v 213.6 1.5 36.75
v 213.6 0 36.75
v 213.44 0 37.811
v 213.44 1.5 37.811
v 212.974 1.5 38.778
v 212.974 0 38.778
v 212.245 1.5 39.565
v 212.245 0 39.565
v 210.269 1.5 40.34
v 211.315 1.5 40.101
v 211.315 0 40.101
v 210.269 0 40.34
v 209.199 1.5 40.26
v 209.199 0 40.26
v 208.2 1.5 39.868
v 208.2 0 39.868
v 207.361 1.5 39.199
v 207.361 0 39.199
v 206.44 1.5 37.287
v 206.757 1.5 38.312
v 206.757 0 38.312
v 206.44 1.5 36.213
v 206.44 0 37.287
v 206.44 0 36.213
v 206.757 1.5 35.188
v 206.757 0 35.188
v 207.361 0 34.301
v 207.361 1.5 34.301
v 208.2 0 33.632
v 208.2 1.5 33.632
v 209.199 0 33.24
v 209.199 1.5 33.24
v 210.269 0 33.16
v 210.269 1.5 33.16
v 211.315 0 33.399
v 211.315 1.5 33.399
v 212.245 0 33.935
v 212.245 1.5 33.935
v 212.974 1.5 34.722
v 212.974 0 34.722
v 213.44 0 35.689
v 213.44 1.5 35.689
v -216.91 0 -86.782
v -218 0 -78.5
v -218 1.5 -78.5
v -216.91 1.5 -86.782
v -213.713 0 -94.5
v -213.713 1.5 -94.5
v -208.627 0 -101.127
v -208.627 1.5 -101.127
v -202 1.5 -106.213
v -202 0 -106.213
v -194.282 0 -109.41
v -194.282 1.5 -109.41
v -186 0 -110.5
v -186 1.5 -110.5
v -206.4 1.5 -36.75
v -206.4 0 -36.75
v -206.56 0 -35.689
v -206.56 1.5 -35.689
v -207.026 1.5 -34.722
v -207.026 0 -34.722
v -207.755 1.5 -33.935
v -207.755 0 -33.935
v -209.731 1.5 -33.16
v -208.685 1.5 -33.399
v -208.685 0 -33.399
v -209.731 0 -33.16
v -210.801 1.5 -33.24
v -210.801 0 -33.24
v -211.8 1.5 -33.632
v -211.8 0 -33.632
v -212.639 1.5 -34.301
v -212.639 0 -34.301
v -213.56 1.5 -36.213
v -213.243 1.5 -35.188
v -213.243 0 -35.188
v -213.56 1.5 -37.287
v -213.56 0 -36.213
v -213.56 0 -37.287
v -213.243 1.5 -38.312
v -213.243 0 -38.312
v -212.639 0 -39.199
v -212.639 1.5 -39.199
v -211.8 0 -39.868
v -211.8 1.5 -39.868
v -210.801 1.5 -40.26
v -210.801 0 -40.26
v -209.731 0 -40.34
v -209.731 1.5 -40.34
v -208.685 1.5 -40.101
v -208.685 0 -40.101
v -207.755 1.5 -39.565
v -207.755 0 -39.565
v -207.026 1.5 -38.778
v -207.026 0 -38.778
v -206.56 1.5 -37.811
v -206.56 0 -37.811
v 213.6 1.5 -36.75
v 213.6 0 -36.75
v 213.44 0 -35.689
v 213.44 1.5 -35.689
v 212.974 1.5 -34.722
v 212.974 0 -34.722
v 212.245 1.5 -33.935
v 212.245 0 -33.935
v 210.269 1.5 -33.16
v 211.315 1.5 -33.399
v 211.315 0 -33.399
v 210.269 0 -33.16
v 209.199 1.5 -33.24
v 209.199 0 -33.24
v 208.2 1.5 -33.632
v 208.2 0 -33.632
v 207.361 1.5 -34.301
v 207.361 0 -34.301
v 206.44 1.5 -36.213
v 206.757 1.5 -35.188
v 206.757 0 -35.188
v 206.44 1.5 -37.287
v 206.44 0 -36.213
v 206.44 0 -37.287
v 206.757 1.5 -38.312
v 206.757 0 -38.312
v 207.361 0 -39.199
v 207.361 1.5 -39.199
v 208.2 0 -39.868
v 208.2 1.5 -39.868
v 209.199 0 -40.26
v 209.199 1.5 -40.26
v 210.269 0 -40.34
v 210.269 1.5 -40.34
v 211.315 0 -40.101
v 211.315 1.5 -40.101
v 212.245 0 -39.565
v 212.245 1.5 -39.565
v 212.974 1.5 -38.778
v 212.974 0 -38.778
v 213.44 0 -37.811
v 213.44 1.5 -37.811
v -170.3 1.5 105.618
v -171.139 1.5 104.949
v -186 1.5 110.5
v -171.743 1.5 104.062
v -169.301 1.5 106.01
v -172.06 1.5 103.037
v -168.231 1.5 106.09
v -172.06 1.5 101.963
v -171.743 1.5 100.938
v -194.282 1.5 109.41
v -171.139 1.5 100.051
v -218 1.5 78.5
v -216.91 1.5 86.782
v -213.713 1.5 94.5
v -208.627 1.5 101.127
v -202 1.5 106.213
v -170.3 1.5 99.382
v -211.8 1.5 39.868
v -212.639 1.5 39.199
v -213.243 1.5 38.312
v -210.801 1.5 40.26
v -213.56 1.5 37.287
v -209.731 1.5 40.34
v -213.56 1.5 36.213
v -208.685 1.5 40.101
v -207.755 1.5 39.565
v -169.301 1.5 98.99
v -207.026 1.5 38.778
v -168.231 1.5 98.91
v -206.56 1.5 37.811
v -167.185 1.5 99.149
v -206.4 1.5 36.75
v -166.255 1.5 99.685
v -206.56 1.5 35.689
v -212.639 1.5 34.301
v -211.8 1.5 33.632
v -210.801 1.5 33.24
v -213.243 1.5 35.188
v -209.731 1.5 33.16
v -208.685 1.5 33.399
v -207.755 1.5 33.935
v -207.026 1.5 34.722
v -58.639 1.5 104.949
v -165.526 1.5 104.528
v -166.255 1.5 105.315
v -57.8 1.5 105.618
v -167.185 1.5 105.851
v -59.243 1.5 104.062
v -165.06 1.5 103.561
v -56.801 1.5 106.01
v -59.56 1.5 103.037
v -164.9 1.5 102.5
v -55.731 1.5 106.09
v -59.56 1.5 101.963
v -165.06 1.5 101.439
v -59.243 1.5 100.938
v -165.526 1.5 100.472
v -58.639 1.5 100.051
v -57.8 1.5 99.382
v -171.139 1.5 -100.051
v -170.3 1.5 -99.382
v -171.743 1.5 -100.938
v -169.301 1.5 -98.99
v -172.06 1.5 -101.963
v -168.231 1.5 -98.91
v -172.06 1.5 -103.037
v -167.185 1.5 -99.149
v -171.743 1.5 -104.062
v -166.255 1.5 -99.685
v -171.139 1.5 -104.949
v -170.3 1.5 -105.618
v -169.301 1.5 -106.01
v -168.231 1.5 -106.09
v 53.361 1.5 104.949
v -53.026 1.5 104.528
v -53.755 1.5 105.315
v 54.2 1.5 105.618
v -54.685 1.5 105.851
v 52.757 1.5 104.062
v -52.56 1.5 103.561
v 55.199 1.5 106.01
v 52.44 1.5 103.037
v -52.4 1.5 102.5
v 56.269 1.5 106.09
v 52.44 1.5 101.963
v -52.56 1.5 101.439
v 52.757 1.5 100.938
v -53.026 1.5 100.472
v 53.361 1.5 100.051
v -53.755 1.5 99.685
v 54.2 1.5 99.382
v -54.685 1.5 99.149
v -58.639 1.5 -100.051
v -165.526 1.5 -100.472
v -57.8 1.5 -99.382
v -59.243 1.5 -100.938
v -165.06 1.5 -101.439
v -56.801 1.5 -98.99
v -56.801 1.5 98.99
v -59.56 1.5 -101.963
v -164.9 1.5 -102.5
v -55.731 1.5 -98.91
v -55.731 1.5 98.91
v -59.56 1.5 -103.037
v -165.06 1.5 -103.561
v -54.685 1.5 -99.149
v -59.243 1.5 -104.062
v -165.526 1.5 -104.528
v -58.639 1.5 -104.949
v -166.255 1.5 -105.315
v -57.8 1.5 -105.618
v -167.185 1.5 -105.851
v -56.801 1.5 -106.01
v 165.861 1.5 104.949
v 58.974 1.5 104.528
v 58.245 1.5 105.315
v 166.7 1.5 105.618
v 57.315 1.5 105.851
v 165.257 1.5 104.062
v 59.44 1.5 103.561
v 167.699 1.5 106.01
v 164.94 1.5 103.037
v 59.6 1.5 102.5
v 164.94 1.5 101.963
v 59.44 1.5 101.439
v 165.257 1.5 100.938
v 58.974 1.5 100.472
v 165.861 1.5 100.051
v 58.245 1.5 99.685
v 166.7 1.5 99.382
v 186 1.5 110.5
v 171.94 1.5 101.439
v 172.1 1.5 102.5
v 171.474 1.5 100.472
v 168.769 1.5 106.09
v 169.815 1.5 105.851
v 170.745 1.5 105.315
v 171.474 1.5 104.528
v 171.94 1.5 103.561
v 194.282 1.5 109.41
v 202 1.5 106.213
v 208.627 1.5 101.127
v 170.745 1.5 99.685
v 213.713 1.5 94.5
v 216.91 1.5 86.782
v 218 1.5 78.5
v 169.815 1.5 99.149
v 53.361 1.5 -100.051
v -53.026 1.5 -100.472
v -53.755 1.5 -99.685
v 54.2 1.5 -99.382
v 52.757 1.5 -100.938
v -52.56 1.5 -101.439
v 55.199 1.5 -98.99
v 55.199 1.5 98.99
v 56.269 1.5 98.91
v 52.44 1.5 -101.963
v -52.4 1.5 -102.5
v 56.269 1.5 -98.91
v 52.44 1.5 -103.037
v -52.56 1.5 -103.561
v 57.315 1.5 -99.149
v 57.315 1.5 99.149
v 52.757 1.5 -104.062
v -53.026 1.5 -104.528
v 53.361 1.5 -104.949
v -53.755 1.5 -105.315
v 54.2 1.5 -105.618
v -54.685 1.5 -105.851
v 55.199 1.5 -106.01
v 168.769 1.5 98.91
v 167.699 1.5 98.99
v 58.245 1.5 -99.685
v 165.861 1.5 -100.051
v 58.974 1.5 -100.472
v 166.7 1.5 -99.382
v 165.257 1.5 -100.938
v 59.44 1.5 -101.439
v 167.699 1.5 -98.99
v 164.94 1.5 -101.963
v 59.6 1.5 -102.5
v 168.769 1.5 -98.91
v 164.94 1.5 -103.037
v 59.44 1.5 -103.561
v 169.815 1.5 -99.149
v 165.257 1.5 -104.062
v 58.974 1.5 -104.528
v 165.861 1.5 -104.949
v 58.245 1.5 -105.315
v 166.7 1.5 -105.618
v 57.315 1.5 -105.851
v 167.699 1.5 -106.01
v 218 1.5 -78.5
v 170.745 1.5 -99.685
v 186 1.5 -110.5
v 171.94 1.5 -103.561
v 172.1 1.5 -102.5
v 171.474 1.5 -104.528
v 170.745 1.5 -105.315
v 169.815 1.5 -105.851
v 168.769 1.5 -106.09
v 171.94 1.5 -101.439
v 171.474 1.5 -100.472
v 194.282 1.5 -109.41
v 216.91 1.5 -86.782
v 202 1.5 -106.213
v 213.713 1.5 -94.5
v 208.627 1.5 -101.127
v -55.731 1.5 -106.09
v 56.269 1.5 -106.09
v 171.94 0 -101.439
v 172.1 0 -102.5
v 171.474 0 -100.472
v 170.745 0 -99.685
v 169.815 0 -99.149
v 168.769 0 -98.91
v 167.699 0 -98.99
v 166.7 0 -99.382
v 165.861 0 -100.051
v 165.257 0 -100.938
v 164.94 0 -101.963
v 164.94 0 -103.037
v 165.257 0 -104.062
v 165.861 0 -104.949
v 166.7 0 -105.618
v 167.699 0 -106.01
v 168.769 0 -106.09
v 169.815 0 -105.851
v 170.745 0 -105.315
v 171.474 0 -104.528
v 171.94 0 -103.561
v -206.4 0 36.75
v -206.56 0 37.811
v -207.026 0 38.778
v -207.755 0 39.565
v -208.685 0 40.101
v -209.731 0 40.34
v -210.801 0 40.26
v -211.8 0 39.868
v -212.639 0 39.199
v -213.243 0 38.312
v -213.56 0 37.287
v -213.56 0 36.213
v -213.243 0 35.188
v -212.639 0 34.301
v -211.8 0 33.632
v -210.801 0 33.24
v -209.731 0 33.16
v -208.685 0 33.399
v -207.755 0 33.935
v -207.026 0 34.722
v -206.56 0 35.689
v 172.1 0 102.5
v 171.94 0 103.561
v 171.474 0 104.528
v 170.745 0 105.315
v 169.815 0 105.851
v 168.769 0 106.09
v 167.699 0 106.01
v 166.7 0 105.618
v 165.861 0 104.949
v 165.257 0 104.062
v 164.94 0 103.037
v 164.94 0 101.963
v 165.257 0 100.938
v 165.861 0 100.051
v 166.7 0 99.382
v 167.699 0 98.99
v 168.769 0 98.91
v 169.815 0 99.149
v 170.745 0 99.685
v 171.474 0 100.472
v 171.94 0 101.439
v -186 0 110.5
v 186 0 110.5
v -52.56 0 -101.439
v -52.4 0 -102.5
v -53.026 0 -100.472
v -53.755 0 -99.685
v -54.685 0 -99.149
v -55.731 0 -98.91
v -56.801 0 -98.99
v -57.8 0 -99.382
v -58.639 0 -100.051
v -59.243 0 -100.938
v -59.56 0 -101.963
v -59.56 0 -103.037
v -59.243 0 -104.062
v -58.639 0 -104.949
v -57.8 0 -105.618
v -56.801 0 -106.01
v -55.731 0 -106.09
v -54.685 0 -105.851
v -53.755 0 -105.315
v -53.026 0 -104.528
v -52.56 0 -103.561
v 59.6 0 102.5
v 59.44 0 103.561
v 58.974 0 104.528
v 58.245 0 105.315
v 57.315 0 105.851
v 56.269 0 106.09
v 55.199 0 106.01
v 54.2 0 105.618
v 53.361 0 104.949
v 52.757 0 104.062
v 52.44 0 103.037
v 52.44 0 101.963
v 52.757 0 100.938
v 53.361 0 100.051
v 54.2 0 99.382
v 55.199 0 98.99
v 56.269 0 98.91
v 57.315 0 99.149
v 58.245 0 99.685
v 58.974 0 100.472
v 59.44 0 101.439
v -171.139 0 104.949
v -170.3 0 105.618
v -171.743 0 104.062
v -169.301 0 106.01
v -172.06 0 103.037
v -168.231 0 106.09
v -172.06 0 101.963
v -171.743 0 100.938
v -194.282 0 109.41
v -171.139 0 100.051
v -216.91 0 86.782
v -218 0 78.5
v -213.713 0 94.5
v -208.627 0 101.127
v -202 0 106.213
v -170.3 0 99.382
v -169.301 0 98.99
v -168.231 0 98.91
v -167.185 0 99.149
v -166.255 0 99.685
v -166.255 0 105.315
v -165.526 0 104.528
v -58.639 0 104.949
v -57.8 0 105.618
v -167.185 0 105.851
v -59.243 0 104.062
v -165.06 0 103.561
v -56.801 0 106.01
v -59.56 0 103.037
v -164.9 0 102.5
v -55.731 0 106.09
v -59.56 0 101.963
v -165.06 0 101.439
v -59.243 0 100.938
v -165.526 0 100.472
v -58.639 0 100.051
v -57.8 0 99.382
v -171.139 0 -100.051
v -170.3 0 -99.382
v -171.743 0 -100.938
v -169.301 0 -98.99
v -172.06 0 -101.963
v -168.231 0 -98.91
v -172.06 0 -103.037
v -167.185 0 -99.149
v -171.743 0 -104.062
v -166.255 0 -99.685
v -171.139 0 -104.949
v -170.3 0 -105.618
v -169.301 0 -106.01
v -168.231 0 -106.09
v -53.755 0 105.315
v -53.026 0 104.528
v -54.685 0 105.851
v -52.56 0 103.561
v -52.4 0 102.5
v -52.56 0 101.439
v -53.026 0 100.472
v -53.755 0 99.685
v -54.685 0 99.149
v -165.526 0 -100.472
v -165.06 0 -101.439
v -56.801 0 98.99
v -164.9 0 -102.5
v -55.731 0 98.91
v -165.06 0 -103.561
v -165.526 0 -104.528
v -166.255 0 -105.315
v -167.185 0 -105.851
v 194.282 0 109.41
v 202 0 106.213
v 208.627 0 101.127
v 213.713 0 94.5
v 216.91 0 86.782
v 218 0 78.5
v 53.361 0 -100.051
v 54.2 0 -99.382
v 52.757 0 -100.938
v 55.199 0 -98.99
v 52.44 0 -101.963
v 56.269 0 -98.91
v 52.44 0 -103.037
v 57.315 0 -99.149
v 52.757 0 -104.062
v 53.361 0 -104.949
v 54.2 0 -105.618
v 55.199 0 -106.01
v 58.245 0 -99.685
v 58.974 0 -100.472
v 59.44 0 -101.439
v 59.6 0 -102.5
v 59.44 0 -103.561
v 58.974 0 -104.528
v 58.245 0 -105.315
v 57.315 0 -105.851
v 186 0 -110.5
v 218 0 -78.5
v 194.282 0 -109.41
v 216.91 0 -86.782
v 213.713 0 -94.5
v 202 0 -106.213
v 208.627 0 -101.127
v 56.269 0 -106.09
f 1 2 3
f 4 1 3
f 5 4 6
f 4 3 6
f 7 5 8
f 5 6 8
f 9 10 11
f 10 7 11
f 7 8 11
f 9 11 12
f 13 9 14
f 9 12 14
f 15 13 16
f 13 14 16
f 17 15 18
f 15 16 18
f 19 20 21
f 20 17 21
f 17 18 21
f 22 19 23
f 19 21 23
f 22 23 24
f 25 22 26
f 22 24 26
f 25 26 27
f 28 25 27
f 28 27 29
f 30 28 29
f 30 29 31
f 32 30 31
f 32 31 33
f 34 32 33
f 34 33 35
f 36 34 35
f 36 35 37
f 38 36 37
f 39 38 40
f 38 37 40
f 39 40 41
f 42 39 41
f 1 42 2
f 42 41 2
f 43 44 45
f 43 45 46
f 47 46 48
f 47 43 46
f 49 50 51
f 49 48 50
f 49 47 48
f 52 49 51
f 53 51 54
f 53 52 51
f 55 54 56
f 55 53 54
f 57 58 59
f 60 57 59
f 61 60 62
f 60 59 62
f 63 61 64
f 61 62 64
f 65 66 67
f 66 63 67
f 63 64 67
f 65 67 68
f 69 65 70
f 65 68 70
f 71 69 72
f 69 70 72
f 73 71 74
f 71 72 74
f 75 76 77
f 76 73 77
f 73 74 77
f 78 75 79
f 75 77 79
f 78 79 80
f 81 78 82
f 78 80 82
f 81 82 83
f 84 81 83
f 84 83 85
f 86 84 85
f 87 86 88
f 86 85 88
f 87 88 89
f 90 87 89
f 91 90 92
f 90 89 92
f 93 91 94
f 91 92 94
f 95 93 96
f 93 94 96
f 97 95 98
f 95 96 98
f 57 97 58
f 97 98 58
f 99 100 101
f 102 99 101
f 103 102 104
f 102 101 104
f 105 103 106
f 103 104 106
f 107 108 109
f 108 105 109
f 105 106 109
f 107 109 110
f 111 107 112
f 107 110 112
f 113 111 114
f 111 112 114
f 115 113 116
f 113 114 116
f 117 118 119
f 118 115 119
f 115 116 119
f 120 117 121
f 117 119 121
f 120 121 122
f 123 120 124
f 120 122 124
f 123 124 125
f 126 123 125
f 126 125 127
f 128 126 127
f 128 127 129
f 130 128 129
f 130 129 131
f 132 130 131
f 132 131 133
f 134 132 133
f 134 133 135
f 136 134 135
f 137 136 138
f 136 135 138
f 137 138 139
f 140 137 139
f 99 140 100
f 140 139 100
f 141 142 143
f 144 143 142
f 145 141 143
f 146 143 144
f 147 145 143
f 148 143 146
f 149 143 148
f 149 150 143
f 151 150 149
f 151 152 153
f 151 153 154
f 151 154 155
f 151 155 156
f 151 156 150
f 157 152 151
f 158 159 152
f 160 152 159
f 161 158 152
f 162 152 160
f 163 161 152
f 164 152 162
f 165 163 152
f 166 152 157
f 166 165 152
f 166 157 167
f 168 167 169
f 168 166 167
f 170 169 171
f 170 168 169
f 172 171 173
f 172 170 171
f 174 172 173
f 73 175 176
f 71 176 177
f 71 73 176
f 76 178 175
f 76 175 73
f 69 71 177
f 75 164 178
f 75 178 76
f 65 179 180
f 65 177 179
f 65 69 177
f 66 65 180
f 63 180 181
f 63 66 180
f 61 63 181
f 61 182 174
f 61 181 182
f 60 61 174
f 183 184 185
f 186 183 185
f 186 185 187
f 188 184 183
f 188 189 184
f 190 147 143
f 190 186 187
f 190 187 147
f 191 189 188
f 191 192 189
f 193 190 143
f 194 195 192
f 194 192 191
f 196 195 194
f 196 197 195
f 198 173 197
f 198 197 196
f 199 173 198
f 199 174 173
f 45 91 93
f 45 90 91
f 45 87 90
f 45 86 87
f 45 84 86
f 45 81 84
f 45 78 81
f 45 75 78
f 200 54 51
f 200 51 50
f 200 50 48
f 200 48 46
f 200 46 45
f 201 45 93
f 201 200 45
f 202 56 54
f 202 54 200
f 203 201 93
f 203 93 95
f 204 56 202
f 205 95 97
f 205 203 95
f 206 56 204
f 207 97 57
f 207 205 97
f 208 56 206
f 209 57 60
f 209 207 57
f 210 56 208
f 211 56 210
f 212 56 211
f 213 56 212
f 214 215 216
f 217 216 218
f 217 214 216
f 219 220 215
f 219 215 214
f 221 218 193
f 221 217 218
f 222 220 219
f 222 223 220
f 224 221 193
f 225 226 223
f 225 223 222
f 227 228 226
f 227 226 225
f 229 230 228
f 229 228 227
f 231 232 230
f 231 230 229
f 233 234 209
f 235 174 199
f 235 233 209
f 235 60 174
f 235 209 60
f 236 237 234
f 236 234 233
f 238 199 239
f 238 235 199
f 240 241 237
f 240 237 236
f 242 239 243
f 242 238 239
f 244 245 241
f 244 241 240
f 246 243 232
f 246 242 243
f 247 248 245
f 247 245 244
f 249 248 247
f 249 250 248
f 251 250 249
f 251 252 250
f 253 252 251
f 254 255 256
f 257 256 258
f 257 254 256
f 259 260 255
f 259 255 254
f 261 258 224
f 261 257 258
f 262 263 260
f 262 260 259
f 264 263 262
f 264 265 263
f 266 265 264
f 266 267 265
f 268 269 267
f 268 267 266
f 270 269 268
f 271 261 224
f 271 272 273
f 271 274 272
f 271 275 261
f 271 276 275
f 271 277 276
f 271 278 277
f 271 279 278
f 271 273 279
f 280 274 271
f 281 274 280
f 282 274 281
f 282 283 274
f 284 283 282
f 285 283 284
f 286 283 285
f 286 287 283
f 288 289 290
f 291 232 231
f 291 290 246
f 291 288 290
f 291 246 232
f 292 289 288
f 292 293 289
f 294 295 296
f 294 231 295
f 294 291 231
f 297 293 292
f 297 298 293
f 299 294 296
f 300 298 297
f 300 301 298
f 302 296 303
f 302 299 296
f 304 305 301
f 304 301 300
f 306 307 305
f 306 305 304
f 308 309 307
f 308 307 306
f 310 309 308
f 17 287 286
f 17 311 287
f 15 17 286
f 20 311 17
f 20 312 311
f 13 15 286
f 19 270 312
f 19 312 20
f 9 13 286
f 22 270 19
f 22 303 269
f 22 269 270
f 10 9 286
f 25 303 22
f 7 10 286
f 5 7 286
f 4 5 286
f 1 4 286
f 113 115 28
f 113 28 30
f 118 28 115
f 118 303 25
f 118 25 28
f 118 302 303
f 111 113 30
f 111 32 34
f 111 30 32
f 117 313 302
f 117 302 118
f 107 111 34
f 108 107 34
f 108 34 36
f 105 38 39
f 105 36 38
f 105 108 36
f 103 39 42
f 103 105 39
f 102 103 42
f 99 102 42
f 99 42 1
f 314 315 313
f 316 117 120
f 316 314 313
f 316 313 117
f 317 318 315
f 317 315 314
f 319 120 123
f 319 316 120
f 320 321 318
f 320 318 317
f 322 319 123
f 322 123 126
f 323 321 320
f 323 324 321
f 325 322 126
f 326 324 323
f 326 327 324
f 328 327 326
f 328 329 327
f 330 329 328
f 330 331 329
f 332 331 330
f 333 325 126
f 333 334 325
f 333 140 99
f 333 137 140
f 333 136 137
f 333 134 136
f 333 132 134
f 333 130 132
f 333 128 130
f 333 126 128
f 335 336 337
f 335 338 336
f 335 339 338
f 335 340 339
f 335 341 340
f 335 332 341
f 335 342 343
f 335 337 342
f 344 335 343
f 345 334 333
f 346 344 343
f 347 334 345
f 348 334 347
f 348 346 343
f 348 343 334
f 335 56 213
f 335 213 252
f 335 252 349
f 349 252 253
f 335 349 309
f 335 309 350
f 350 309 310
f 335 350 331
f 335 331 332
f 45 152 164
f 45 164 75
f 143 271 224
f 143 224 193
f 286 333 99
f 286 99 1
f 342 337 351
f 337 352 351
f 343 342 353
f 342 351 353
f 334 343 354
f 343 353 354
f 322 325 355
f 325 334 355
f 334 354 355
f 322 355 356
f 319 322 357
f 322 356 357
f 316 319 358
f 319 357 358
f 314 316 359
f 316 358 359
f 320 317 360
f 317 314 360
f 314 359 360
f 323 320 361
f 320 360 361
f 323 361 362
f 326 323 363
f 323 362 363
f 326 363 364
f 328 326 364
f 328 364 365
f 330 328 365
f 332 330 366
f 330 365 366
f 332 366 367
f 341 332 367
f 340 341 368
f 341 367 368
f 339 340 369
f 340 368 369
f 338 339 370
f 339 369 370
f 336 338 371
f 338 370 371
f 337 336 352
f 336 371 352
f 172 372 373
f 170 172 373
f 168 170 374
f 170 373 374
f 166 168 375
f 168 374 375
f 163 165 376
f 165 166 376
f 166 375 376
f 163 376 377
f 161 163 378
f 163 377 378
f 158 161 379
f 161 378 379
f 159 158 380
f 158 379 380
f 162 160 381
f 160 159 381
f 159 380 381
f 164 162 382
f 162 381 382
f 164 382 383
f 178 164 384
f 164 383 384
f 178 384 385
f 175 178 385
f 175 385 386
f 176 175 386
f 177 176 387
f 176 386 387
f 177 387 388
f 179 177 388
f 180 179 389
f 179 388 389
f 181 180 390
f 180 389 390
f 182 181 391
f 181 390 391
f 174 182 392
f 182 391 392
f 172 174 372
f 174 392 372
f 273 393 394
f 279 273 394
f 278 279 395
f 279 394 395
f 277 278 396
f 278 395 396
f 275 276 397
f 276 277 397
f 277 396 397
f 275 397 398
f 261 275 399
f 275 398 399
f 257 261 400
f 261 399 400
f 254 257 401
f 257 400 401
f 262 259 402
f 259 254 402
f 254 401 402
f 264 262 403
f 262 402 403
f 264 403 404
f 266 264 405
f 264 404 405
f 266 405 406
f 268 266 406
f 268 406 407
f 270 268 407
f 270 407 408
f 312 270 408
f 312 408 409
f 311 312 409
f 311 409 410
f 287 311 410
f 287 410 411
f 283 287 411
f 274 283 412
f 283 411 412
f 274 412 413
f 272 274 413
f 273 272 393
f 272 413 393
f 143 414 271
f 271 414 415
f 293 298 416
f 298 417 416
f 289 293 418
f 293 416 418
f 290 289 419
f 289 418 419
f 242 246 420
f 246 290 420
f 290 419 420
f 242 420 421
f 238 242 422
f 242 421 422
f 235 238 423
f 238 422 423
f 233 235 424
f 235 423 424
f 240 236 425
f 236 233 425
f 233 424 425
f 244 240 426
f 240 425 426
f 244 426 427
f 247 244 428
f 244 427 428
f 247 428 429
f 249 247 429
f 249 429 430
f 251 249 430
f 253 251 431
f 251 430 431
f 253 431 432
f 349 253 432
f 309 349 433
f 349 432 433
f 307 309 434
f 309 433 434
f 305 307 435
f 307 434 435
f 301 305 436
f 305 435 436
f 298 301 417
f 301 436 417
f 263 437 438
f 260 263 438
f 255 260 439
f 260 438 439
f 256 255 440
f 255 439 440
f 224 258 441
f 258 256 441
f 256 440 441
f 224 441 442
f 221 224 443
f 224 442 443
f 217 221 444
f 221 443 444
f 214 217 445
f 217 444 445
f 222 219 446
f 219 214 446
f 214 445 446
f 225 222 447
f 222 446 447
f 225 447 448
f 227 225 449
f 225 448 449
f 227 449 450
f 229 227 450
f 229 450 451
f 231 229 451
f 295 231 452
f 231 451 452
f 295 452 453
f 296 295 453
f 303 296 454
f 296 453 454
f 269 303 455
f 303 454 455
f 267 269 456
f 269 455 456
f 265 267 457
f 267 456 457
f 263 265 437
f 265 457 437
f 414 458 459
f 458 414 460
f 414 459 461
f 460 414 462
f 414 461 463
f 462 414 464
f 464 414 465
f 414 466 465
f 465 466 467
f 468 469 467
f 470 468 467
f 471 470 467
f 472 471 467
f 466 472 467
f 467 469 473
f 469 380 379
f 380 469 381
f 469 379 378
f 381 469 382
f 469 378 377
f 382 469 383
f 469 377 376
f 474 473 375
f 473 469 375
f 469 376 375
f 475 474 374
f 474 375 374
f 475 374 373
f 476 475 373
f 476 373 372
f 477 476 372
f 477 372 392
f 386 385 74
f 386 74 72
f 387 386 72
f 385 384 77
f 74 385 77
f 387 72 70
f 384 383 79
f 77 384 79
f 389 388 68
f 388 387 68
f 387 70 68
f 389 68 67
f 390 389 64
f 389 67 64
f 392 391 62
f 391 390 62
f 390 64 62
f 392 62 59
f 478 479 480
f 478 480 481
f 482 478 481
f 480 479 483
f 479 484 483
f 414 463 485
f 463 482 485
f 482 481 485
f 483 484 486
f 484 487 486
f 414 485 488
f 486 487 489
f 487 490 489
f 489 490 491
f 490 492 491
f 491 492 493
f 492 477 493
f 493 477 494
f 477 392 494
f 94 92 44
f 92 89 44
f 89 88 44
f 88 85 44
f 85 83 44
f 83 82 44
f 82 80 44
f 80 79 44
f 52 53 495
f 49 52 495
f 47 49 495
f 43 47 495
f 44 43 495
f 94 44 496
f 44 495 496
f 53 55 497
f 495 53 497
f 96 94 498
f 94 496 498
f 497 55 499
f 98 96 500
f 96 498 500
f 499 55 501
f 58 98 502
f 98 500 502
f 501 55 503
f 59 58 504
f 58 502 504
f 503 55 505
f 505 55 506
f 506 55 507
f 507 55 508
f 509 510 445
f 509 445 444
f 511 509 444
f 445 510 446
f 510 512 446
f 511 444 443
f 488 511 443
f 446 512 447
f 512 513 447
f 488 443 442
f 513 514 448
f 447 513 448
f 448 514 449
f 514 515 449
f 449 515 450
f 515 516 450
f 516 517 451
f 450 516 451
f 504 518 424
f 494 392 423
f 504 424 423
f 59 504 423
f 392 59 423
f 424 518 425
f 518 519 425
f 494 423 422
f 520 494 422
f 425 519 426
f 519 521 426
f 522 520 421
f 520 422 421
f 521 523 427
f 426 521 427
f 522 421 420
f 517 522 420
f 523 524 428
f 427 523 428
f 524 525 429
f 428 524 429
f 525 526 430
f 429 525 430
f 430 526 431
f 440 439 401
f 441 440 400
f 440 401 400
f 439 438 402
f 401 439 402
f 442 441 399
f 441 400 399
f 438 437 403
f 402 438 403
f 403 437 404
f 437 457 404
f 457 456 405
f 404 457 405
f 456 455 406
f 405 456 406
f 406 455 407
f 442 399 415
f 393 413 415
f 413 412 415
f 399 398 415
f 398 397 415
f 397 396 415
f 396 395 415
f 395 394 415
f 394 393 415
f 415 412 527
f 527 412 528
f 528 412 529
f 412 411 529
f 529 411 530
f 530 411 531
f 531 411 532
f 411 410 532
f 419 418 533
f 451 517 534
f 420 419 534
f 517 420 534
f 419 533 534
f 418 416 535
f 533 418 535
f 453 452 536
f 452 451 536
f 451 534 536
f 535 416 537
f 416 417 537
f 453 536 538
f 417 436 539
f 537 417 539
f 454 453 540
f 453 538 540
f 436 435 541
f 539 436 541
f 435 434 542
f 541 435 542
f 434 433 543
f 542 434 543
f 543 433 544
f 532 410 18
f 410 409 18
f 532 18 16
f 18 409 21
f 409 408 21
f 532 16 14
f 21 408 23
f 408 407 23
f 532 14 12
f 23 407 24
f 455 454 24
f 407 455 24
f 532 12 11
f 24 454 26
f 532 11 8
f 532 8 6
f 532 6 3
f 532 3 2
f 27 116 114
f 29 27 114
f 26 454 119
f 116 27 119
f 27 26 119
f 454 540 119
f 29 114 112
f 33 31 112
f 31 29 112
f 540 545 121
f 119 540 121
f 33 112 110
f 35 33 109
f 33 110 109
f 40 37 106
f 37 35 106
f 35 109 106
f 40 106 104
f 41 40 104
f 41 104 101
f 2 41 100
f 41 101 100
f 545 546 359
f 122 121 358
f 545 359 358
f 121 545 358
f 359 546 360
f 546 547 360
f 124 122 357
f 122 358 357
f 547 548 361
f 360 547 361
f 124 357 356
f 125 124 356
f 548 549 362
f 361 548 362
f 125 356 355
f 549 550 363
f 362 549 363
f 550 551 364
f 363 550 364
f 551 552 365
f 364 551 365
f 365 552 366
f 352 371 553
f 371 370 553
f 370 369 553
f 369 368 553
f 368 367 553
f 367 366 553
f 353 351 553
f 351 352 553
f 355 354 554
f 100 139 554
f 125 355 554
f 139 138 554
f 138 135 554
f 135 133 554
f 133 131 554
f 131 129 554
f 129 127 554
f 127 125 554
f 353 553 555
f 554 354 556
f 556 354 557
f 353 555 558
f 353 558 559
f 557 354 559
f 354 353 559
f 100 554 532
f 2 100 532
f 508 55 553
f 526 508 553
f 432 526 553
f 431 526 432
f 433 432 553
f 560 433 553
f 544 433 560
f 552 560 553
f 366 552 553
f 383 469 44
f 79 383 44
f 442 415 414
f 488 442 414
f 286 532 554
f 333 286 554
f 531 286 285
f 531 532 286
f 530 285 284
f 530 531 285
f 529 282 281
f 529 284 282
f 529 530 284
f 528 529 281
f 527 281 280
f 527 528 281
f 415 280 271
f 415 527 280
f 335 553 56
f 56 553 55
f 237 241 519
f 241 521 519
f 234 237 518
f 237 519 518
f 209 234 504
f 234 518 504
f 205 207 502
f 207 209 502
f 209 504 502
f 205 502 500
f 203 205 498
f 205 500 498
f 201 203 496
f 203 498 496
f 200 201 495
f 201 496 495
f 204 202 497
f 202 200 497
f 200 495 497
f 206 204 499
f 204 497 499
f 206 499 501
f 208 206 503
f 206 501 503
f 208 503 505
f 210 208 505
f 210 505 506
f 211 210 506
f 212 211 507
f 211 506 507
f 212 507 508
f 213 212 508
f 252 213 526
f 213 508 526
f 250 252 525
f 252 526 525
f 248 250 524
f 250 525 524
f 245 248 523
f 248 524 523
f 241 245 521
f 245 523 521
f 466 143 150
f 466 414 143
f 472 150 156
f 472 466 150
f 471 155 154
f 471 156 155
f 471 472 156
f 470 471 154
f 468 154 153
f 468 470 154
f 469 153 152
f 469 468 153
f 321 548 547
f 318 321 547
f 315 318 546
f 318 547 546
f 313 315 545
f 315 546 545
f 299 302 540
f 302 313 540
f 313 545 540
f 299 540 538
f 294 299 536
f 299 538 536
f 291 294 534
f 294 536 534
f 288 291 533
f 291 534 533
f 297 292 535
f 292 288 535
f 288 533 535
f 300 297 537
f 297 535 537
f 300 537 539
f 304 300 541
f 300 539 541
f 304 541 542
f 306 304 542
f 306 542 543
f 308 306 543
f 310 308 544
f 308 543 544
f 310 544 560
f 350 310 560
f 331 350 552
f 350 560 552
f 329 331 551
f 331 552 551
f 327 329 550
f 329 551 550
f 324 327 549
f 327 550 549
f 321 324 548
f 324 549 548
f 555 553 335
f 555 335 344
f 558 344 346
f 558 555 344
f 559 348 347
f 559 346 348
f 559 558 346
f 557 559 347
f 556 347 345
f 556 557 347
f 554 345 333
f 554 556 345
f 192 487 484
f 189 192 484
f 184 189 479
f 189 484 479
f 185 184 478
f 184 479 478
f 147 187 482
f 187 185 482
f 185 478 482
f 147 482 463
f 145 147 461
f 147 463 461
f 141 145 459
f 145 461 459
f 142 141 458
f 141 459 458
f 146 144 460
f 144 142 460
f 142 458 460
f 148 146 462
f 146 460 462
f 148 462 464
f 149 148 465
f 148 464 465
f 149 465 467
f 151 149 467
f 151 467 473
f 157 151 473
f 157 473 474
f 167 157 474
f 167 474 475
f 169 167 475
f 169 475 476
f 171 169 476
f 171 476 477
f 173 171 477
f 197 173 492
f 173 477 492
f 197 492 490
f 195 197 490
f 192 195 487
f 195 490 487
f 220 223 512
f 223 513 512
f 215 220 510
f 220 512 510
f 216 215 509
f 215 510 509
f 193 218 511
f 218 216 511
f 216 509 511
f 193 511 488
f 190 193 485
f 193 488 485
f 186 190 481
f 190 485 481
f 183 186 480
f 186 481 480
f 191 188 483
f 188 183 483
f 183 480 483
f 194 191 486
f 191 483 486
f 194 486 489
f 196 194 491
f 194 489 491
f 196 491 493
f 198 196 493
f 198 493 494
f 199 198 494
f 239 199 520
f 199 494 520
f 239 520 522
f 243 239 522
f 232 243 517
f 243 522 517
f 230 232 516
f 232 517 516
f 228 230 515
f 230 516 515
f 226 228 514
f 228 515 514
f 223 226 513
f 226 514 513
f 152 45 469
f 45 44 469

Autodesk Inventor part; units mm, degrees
sketch "Sketch_1" plane through (0, 0, 0) normal (0, 1, 0) x (1, 0, 0)
  arc A0 (-218, -78.5) -> (-186, -110.5) centre (-186, -78.5) ccw
  line L0 (-186, -110.5) -> (186, -110.5)
  arc A1 (186, -110.5) -> (218, -78.5) centre (186, -78.5) ccw
  line L1 (218, -78.5) -> (218, 78.5)
  arc A2 (218, 78.5) -> (186, 110.5) centre (186, 78.5) ccw
  line L2 (186, 110.5) -> (-186, 110.5)
  arc A3 (-186, 110.5) -> (-218, 78.5) centre (-186, 78.5) ccw
  line L3 (-218, 78.5) -> (-218, -78.5)
  circle A4 centre (210, -36.75) radius 3.6
  circle A5 centre (210, 36.75) radius 3.6
  circle A6 centre (168.5, -102.5) radius 3.6
  circle A7 centre (168.5, 102.5) radius 3.6
  circle A8 centre (56, -102.5) radius 3.6
  circle A9 centre (56, 102.5) radius 3.6
  circle A10 centre (-56, -102.5) radius 3.6
  circle A11 centre (-56, 102.5) radius 3.6
  circle A12 centre (-168.5, -102.5) radius 3.6
  circle A13 centre (-168.5, 102.5) radius 3.6
  circle A14 centre (-210, -36.75) radius 3.6
  circle A15 centre (-210, 36.75) radius 3.6
extrude "Extrusion1" add sketch "Sketch_1" along normal blind 1.5
ref_plane "FP_XY" through (0, 0, 0) normal (0, -1, 0) x (1, 0, 0)
ref_plane "FP_YZ" through (0, 0, 0) normal (1, 0, 0) x (0, 0, 1)
ref_plane "FP_ZX" through (0, 0, 0) normal (0, 0, 1) x (0, -1, 0)
ref_plane "to_Bolt_1_XY" through (-210, 0, -36.75) normal (0, 1, 0) x (1, 0, 0)
ref_plane "to_Bolt_1_YZ" through (-210, 0, -36.75) normal (1, 0, 0) x (0, 0, -1)
ref_plane "to_Bolt_1_ZX" through (-210, 0, -36.75) normal (0, 0, -1) x (0, 1, 0)
ref_plane "to_Bolt_1_1_XY" through (-168.5, 0, -102.5) normal (0, 1, 0) x (1, 0, 0)
ref_plane "to_Bolt_1_1_YZ" through (-168.5, 0, -102.5) normal (1, 0, 0) x (0, 0, -1)
ref_plane "to_Bolt_1_1_ZX" through (-168.5, 0, -102.5) normal (0, 0, -1) x (0, 1, 0)
ref_plane "to_Bolt_1_2_XY" through (-56.1667, 0, -102.5) normal (0, 1, 0) x (1, 0, 0)
ref_plane "to_Bolt_1_2_YZ" through (-56.1667, 0, -102.5) normal (1, 0, 0) x (0, 0, -1)
ref_plane "to_Bolt_1_2_ZX" through (-56.1667, 0, -102.5) normal (0, 0, -1) x (0, 1, 0)
ref_plane "to_Bolt_1_3_XY" through (56.1667, 0, -102.5) normal (0, 1, 0) x (1, 0, 0)
ref_plane "to_Bolt_1_3_YZ" through (56.1667, 0, -102.5) normal (1, 0, 0) x (0, 0, -1)
ref_plane "to_Bolt_1_3_ZX" through (56.1667, 0, -102.5) normal (0, 0, -1) x (0, 1, 0)
ref_plane "to_Bolt_1_4_XY" through (168.5, 0, -102.5) normal (0, 1, 0) x (1, 0, 0)
ref_plane "to_Bolt_1_4_YZ" through (168.5, 0, -102.5) normal (1, 0, 0) x (0, 0, -1)
ref_plane "to_Bolt_1_4_ZX" through (168.5, 0, -102.5) normal (0, 0, -1) x (0, 1, 0)
ref_plane "to_Bolt_1_5_XY" through (-168.5, 0, 102.5) normal (0, 1, 0) x (1, 0, 0)
ref_plane "to_Bolt_1_5_YZ" through (-168.5, 0, 102.5) normal (1, 0, 0) x (0, 0, -1)
ref_plane "to_Bolt_1_5_ZX" through (-168.5, 0, 102.5) normal (0, 0, -1) x (0, 1, 0)
ref_plane "to_Bolt_1_6_XY" through (-56.1667, 0, 102.5) normal (0, 1, 0) x (1, 0, 0)
ref_plane "to_Bolt_1_6_YZ" through (-56.1667, 0, 102.5) normal (1, 0, 0) x (0, 0, -1)
ref_plane "to_Bolt_1_6_ZX" through (-56.1667, 0, 102.5) normal (0, 0, -1) x (0, 1, 0)
ref_plane "to_Bolt_1_7_XY" through (56.1667, 0, 102.5) normal (0, 1, 0) x (1, 0, 0)
ref_plane "to_Bolt_1_7_YZ" through (56.1667, 0, 102.5) normal (1, 0, 0) x (0, 0, -1)
ref_plane "to_Bolt_1_7_ZX" through (56.1667, 0, 102.5) normal (0, 0, -1) x (0, 1, 0)
ref_plane "to_Bolt_1_8_XY" through (168.5, 0, 102.5) normal (0, 1, 0) x (1, 0, 0)
ref_plane "to_Bolt_1_8_YZ" through (168.5, 0, 102.5) normal (1, 0, 0) x (0, 0, -1)
ref_plane "to_Bolt_1_8_ZX" through (168.5, 0, 102.5) normal (0, 0, -1) x (0, 1, 0)
ref_plane "to_Bolt_2_XY" through (210, 0, -36.75) normal (0, 1, 0) x (1, 0, 0)
ref_plane "to_Bolt_2_YZ" through (210, 0, -36.75) normal (1, 0, 0) x (0, 0, -1)
ref_plane "to_Bolt_2_ZX" through (210, 0, -36.75) normal (0, 0, -1) x (0, 1, 0)
ref_plane "to_Bolt_3_XY" through (-210, 0, 36.75) normal (0, 1, 0) x (1, 0, 0)
ref_plane "to_Bolt_3_YZ" through (-210, 0, 36.75) normal (1, 0, 0) x (0, 0, -1)
ref_plane "to_Bolt_3_ZX" through (-210, 0, 36.75) normal (0, 0, -1) x (0, 1, 0)
ref_plane "to_Bolt_4_XY" through (210, 0, 36.75) normal (0, 1, 0) x (1, 0, 0)
ref_plane "to_Bolt_4_YZ" through (210, 0, 36.75) normal (1, 0, 0) x (0, 0, -1)
ref_plane "to_Bolt_4_ZX" through (210, 0, 36.75) normal (0, 0, -1) x (0, 1, 0)
properties part number "1XX1_04_00_1(1)_P5"
